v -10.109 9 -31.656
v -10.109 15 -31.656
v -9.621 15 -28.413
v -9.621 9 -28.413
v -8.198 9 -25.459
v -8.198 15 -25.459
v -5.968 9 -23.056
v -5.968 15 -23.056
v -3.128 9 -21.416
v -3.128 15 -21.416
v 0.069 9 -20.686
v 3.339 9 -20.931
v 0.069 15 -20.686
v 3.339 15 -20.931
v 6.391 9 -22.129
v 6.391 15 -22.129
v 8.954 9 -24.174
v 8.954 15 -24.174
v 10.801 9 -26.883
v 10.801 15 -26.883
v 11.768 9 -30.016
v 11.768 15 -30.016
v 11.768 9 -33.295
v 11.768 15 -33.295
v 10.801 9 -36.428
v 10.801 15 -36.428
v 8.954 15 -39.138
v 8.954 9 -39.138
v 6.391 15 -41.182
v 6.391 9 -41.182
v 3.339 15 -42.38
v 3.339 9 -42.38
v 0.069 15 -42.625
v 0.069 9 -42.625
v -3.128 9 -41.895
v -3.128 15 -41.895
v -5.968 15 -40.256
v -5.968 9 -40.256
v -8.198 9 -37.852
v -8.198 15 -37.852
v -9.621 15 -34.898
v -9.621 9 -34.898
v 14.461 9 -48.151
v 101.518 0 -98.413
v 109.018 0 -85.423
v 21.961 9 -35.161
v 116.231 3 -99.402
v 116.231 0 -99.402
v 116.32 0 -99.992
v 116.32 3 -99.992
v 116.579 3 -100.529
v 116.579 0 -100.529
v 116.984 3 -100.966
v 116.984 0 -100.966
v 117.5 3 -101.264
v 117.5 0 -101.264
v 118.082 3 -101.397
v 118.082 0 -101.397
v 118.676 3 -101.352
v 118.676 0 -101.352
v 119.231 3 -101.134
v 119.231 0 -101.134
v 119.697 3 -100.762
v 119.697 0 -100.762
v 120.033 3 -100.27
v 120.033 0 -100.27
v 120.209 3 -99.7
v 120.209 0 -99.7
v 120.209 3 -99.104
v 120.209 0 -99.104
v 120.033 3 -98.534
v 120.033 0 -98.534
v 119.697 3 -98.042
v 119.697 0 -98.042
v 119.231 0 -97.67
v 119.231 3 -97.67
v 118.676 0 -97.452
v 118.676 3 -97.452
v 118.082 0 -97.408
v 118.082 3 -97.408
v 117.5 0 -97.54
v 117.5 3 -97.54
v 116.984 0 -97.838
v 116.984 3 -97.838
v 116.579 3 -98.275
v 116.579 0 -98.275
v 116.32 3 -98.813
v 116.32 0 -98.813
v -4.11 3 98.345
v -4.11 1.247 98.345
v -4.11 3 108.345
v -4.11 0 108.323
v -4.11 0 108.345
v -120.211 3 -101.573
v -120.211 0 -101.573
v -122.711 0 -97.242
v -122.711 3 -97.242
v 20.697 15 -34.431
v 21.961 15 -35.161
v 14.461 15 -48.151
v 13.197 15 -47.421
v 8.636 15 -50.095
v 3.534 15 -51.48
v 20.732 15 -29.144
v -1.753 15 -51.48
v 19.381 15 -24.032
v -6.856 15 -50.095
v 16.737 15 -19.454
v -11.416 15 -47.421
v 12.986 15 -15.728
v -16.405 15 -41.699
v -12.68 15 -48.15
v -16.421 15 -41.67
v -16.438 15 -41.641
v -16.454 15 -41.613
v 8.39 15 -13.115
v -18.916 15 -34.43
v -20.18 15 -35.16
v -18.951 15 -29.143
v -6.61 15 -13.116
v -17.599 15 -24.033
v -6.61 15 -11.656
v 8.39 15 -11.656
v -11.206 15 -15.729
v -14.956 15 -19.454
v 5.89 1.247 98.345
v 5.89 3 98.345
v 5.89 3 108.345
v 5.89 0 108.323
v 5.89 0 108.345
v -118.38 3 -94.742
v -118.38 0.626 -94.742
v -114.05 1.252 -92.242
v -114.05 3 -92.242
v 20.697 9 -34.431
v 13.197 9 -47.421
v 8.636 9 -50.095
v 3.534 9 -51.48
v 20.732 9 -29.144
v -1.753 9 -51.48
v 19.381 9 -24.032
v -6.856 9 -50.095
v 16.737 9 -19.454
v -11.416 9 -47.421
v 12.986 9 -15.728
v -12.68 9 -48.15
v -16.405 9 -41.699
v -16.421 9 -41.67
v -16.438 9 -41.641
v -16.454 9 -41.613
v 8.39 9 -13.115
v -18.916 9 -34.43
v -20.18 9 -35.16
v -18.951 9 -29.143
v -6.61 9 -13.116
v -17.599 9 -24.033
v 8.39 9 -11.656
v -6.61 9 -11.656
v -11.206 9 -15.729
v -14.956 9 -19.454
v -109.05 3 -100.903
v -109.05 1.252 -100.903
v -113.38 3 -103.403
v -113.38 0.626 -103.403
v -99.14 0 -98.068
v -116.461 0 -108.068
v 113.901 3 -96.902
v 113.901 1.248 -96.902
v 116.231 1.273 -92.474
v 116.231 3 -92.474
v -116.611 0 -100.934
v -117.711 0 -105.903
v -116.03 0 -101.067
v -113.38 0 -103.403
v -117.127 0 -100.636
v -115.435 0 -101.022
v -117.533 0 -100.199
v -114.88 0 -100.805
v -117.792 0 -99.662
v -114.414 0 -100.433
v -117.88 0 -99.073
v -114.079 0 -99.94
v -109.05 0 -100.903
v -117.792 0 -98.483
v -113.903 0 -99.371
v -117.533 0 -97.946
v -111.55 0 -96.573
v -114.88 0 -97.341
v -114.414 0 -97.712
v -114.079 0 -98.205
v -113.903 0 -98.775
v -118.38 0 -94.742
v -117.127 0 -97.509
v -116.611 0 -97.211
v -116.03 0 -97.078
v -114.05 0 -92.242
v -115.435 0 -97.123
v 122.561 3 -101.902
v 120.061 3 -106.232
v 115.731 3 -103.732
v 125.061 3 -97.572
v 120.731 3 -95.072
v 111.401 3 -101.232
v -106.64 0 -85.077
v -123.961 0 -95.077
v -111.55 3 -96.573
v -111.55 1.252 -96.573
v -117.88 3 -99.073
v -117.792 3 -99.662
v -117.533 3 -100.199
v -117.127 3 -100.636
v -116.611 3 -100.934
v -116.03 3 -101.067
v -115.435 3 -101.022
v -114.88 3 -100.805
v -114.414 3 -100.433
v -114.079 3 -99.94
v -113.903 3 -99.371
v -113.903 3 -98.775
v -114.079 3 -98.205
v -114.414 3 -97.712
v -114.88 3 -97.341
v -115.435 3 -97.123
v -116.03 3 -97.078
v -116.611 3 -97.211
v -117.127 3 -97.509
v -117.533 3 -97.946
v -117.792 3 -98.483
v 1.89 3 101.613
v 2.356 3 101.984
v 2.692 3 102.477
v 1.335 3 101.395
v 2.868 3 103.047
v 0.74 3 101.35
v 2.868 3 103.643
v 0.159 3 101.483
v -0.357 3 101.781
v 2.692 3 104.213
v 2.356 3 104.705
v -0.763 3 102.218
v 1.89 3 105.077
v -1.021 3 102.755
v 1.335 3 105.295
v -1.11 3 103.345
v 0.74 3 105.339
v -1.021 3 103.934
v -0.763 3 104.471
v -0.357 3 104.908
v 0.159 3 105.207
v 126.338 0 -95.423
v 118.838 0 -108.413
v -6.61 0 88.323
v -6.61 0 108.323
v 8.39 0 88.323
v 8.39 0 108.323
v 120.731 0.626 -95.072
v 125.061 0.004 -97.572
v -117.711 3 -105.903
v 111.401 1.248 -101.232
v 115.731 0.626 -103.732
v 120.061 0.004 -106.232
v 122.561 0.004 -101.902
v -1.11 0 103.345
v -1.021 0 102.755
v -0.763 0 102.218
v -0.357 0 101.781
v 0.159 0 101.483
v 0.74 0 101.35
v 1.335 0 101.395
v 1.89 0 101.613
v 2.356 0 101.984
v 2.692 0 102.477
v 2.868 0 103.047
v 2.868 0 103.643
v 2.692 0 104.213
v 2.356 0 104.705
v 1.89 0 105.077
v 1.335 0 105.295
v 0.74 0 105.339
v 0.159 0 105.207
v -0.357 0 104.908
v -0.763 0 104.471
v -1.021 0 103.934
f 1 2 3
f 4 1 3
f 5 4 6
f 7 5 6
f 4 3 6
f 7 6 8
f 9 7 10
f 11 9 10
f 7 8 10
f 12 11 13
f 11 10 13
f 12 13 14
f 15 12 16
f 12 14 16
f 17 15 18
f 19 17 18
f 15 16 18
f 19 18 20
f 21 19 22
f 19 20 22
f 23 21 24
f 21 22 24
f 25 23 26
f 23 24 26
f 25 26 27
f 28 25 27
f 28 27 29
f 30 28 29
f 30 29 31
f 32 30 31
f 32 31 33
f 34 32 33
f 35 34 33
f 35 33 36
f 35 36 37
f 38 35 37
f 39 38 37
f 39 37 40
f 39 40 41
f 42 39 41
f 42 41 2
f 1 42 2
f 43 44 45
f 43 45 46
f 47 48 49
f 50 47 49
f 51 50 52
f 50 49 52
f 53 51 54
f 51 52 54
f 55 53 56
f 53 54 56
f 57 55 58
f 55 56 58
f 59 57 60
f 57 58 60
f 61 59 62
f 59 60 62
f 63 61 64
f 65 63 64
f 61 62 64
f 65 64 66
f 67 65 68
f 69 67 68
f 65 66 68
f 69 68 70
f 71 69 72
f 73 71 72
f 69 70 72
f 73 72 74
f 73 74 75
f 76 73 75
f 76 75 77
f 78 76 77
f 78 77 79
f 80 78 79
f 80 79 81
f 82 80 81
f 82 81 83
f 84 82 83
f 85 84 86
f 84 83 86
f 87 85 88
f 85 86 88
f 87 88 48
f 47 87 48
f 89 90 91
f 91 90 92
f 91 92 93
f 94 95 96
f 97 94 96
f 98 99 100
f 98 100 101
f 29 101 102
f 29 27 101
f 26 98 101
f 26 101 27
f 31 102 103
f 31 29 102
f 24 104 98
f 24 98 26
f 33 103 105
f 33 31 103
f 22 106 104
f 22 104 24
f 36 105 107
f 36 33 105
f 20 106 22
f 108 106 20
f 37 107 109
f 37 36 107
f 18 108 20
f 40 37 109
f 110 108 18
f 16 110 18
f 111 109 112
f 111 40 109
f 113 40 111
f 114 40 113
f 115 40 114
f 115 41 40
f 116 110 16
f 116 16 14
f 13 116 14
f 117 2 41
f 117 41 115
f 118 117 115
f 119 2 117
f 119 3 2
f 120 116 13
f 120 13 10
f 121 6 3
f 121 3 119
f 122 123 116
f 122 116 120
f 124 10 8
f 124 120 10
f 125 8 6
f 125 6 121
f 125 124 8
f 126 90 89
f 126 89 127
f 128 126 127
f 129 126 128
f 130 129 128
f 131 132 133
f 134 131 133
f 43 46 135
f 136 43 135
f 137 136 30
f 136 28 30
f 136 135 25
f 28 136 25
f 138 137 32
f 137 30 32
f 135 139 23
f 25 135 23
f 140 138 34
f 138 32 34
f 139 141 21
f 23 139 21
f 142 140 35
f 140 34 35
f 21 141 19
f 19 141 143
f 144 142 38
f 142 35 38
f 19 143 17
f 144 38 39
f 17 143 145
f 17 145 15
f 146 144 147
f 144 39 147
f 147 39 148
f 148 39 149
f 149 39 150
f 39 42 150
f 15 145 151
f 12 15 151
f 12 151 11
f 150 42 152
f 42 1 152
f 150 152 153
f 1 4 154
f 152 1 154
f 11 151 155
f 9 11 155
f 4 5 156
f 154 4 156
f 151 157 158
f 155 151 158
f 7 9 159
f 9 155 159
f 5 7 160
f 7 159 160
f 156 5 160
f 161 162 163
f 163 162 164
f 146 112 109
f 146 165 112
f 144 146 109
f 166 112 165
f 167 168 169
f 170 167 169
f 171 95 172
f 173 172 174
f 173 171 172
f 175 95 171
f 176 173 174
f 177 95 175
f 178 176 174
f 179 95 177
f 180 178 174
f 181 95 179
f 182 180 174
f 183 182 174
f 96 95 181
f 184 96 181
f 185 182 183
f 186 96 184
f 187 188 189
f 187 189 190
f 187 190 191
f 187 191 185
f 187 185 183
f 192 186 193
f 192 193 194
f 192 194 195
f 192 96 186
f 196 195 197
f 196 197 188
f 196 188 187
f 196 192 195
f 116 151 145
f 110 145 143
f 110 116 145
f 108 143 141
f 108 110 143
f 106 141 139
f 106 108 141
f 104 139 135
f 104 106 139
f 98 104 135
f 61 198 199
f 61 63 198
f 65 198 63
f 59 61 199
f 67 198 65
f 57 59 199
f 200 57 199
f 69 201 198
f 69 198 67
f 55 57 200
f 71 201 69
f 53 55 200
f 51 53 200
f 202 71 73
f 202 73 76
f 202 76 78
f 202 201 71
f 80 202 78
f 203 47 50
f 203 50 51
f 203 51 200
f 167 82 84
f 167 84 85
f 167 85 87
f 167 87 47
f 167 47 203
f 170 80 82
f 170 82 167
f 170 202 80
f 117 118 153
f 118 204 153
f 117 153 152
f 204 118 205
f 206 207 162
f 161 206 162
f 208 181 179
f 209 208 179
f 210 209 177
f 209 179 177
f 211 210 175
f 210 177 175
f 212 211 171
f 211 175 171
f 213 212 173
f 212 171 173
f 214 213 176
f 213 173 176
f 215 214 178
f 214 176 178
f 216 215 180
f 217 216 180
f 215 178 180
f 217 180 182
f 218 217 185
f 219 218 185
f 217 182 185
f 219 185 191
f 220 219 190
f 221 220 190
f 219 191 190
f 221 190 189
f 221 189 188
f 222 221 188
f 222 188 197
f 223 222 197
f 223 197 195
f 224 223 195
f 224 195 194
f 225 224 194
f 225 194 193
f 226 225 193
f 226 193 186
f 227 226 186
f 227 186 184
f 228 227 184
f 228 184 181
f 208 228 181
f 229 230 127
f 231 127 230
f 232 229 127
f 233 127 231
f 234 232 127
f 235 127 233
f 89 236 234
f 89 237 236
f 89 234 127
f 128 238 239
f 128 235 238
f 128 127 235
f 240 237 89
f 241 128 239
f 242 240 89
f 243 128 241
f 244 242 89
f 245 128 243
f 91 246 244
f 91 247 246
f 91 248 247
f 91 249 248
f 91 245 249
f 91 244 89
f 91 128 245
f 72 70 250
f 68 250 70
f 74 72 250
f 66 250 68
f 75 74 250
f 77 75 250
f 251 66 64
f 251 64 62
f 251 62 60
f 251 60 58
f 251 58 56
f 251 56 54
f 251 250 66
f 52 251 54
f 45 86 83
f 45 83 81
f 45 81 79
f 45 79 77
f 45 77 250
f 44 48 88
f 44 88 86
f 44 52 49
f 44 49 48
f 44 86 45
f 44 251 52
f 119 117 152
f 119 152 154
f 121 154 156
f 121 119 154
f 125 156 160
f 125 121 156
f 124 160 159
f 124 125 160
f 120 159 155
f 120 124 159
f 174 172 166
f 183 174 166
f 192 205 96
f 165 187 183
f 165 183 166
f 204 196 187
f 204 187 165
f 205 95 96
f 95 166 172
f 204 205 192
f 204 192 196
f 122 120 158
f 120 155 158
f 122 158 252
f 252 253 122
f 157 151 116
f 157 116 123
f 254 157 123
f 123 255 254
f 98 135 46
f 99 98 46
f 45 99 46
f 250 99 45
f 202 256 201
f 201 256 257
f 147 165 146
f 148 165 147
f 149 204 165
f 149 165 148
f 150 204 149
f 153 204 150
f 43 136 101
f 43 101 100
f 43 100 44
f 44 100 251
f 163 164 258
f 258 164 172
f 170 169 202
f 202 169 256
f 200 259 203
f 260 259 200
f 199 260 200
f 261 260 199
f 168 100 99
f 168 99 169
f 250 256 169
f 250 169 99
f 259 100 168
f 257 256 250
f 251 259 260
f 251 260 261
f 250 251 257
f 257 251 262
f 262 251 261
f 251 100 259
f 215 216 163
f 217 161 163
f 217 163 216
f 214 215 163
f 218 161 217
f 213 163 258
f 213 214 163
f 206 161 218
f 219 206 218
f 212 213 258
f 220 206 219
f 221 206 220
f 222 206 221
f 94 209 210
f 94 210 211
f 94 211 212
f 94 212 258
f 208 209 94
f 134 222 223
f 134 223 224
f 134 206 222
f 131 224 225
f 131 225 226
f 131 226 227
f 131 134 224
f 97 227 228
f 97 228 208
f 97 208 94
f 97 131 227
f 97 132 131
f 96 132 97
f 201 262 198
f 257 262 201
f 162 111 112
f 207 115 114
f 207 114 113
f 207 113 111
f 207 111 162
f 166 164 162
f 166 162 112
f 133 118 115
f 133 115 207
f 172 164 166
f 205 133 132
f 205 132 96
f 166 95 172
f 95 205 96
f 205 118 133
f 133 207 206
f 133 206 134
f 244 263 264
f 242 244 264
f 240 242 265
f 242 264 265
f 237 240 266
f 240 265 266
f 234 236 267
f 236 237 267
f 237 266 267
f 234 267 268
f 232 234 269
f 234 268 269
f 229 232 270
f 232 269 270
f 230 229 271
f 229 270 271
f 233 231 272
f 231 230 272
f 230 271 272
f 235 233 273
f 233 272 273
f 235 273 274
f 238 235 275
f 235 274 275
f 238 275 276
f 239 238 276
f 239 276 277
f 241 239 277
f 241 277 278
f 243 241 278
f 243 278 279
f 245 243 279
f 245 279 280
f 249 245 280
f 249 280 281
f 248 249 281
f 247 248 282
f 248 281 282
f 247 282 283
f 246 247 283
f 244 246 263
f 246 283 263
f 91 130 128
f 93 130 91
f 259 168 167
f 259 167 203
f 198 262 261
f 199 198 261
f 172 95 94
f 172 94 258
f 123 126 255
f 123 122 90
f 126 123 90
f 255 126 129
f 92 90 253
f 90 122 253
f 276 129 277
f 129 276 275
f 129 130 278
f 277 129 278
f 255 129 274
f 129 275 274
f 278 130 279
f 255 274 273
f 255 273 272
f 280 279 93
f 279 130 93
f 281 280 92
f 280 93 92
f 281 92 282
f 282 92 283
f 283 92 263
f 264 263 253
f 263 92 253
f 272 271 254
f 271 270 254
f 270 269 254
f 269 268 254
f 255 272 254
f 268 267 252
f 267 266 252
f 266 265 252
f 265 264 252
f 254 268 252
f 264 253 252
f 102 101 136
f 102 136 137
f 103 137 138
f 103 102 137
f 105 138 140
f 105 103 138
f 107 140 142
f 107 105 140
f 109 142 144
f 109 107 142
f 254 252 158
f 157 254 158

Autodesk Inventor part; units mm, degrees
ref_plane "YZ Plane" through (0, 0, 0) normal (1, 0, 0) x (0, 1, 0)
ref_plane "XY Plane" through (0, 0, 0) normal (0, 0, 1) x (1, 0, 0)
sketch "Эскиз1" plane through (0, 0, 0) normal (0, 1, 0) x (-1, 0, 0)
  circle A0 centre (-0.8899, -31.6552) radius 10
  circle A1 centre (-0.8899, -31.6552) radius 20
  line L0 (-0.8899, -11.6552) -> (-0.8899, 108.3448)
  line L1 (-0.8899, -31.6552) -> (78.1589, -77.294)
  line L2 (-0.8899, -31.6552) -> (90.3878, -31.6552) construction
  line L3 (78.1589, -77.294) -> (120.2106, -101.5726)
  line L4 (-0.8899, -31.6552) -> (116.9091, -31.6552) construction
  line L5 (-0.8899, -31.6552) -> (-104.8129, -91.6552)
  line L6 (-0.8899, -31.6552) -> (119.1101, -31.6552) construction
  line L7 (-104.8129, -91.6552) -> (-122.5612, -101.9021)
  line L8 (-122.5612, -101.9021) -> (-117.5612, -110.5624)
  line L9 (-117.5612, -110.5624) -> (4.1101, -40.3154)
  line L10 (-122.5612, -101.9021) -> (-127.5612, -93.2419)
  line L11 (-127.5612, -93.2419) -> (-5.8899, -22.9949)
  line L12 (120.2106, -101.5726) -> (125.2106, -92.9123)
  line L13 (125.2106, -92.9123) -> (4.1101, -22.9949)
  line L14 (120.2106, -101.5726) -> (7.7704, -36.6552)
  line L15 (-0.8899, 108.3448) -> (-10.8899, 108.3448)
  line L16 (-10.8899, 108.3448) -> (9.1101, 108.3448)
  line L17 (9.1101, 108.3448) -> (9.1101, -31.6552)
  line L18 (-10.8899, 108.3448) -> (-10.8899, -31.6552)
  line L19 (120.2106, -101.5726) -> (115.2106, -110.2328)
  line L20 (115.2106, -110.2328) -> (-5.8899, -40.3154)
  line L21 (9.1101, 108.3448) -> (9.1101, 88.3448)
  line L22 (9.1101, 88.3448) -> (-10.8899, 88.3448)
  line L23 (-10.8899, 108.3448) -> (9.1101, 88.3448)
  line L24 (9.1101, 108.3448) -> (-10.8899, 88.3448)
  line L25 (-0.8899, 98.3448) -> (-0.8899, 93.3448)
  line L26 (-0.8899, 93.3448) -> (4.1101, 93.3448)
  line L27 (4.1101, 103.3448) -> (-5.8899, 103.3448)
  line L28 (-5.8899, 103.3448) -> (-5.8899, 93.3448)
  line L29 (-5.8899, 93.3448) -> (-0.8899, 93.3448)
  line L30 (-127.5612, -93.2419) -> (-110.2407, -83.2419)
  line L31 (-110.2407, -83.2419) -> (-100.2407, -100.5624)
  line L32 (-127.5612, -93.2419) -> (-100.2407, -100.5624)
  line L33 (-117.5612, -110.5624) -> (-110.2407, -83.2419)
  line L34 (-113.9009, -96.9021) -> (-118.2311, -99.4021)
  line L35 (-118.2311, -99.4021) -> (-115.7311, -103.7322)
  line L36 (-115.7311, -103.7322) -> (-107.0708, -98.7322)
  line L37 (-107.0708, -98.7322) -> (-112.0708, -90.072)
  line L38 (-112.0708, -90.072) -> (-120.7311, -95.072)
  line L39 (-120.7311, -95.072) -> (-118.2311, -99.4021)
  circle A2 centre (-113.9009, -96.9021) radius 2
  line L40 (120.2106, -101.5726) -> (111.5503, -96.5726)
  line L41 (111.5503, -96.5726) -> (102.8901, -91.5726)
  line L42 (102.8901, -91.5726) -> (107.2202, -94.0726)
  line L43 (107.2202, -94.0726) -> (104.7202, -98.4027)
  line L44 (104.7202, -98.4027) -> (113.3805, -103.4027)
  line L45 (113.3805, -103.4027) -> (118.3805, -94.7424)
  line L46 (118.3805, -94.7424) -> (109.7202, -89.7424)
  line L47 (109.7202, -89.7424) -> (107.2202, -94.0726)
  line L48 (104.7202, -98.4027) -> (118.3805, -94.7424)
  circle A3 centre (111.5503, -96.5726) radius 2
  circle A4 centre (-118.2311, -99.4021) radius 2
  line L49 (-113.9009, -96.9021) -> (-116.2311, -92.4739)
  line L50 (-116.2311, -92.4739) -> (-125.0612, -97.572)
  line L51 (-113.9009, -96.9021) -> (-111.4009, -101.2322)
  line L52 (-111.4009, -101.2322) -> (-120.0612, -106.2322)
  line L53 (-125.0612, -97.572) -> (-120.0612, -106.2322)
  line L54 (-5.8899, 103.3448) -> (-5.8899, 108.3448)
  line L55 (4.1101, 103.3448) -> (4.1101, 108.3448)
  line L56 (4.1101, 103.3448) -> (4.1101, 98.3448)
  line L57 (4.1101, 98.3448) -> (-5.8899, 98.3448)
  circle A5 centre (-0.8899, 103.3448) radius 2
  line L58 (118.3805, -94.7424) -> (122.7106, -97.2424)
  line L59 (113.3805, -103.4027) -> (117.7106, -105.9027)
  line L60 (111.5503, -96.5726) -> (109.0503, -100.9027)
  line L61 (111.5503, -96.5726) -> (114.0503, -92.2424)
  circle A6 centre (115.8805, -99.0726) radius 2
  point P0 (0, 0)
  point P1 (-0.8899, 101.3448)
  point P2 (1.1101, 103.3448)
  point P3 (-0.8899, 103.3448)
  dimension "d0" = 20
  dimension "d1" = 40
  dimension "d2" = 120
  dimension "d3" = 30
  dimension "d4" = 120
  dimension "d5" = 150
  dimension "d6" = 10
  dimension "d7" = 10
  dimension "d8" = 10
  dimension "d9" = 10
  dimension "d13" = 20
  dimension "d38" = 5
  dimension "d39" = 20
  dimension "d40" = 5
  dimension "d41" = 4
  dimension "d42" = 10
  dimension "d43" = 10
  dimension "d44" = 5
  dimension "d45" = 10
  dimension "d46" = 10
  dimension "d47" = 10
  dimension "d48" = 4
  dimension "d53" = 4
  dimension "d58" = 4
  dimension "d63" = 4
ref_plane "РабПлоскость1" through (0, 15, 0) normal (0, 1, 0) x (-1, 0, 0)
sketch "Эскиз2" plane through (0, 15, 0) normal (0, 1, 0) x (-1, 0, 0)
  circle A0 centre (-0.8908, -31.6557) radius 10
  circle A1 centre (-0.8908, -31.6557) radius 20
  circle A2 centre (-0.8908, -31.6557) radius 11
  point P0 (0, 0)
  dimension "d11" = 20
  dimension "d12" = 40
  dimension "d68" = 22
extrude "Выдавливание1" add sketch "Эскиз2" against normal blind 6 contours A1 | A2
ref_plane "РабПлоскость2" through (0.8899, 0, -31.6552) normal (0.5, 0, 0.866) x (0.866, 0, -0.5)
ref_plane "РабПлоскость3" through (-120.2106, 0, -101.5726) normal (0.5, 0, -0.866) x (0.866, 0, 0.5)
sketch "Эскиз4" plane through (0.8899, 0, -31.6552) normal (0.5, 0, 0.866) x (0.866, 0, -0.5)
  line L0 (20.0011, 15) -> (-19.9989, 15) projected
  line L1 (-19.9989, 9) -> (20.0011, 9) projected
  line L2 (20.0011, 15) -> (20.0011, 9)
  line L3 (20.0011, 15) -> (140.5253, 0)
  line L4 (140.5253, 0) -> (120.5253, 0)
  line L5 (120.5253, 0) -> (20.0011, 9)
  line L6 (20.0011, 15) -> (19.0011, 15)
  line L7 (20.0011, 15) -> (18.0011, 15)
  line L8 (18.0011, 15) -> (18.0011, 9)
  line L9 (20.0011, 9) -> (18.0011, 9)
  point P0 (-16.5982, 0)
  point P1 (-17.3194, 15)
  point P2 (-17.3194, 15)
  dimension "d22" = 20
  dimension "d25" = 2
extrude "Выдавливание3" add sketch "Эскиз4" along normal mid plane 15
ref_plane "РабПлоскость4" through (0.8899, 0, -11.6552) normal (1, 0, 0) x (0, 0, 1)
sketch "Эскиз5" plane through (0.8899, 0, -11.6552) normal (1, 0, 0) x (0, 0, 1)
  point P0 (11.6552, 0)
sketch "Эскиз6" plane through (0.8899, 0, -11.6552) normal (1, 0, 0) x (0, 0, 1)
  line L0 (-40.0005, -15) -> (-0.0005, -15) projected
  line L1 (-0.0005, -15) -> (119.9781, 0)
  line L2 (119.9781, 0) -> (99.9781, 0)
  line L3 (-0.0005, -9) -> (-40.0005, -9) projected
  line L4 (99.9781, 0) -> (-0.0005, -9)
  line L5 (-0.0005, -9) -> (-2.0005, -9)
  line L6 (-2.0005, -9) -> (-2.0005, -15)
  line L7 (-0.0005, -15) -> (-2.0005, -15)
  point P0 (11.6552, 0)
  point P1 (-35.766, -15)
  point P2 (-22.7756, -15)
  point P3 (-22.7756, -9)
  point P4 (-35.766, -9)
  dimension "d29" = 20
  dimension "d30" = 2
extrude "Выдавливание4" add sketch "Эскиз6" along normal mid plane 15
sketch "Эскиз7" plane through (-120.2106, 0, -101.5726) normal (0.5, 0, -0.866) x (0.866, 0, 0.5)
  line L0 (119.8354, -15) -> (142.6104, -15) projected
  line L1 (119.8354, -15) -> (0, 0)
  line L2 (0, 0) -> (20, 0)
  line L3 (142.6104, -9) -> (119.8354, -9) projected
  line L4 (20, 0) -> (119.8354, -9)
  line L5 (119.8354, -9) -> (121.8354, -9)
  line L6 (121.8354, -9) -> (121.8354, -15)
  line L7 (119.8354, -15) -> (121.8354, -15)
  point P0 (154.8917, 0)
  point P1 (142.6094, -15)
  point P2 (142.6094, -9)
  dimension "d33" = 20
  dimension "d34" = 2
extrude "Выдавливание5" add sketch "Эскиз7" along normal mid plane 15
extrude "Выдавливание8" add sketch "Эскиз1" along normal blind 3 contours L50 L39 A4 L7 L10 | L38 L49 A2 L32 | L32 A2 L7 A4 L39 | L8 L7 A4 L35 L52 | L35 A4 L7 A2 L33 | L33 A2 L51 L36 | A2 L49 L32 | L32 L7 A2 | L33 A2 L7 | L51 A2 L33 picked at (-115.1931, -97.2034) picked at (-114.6016, -98.0289)
extrude "Выдавливание9" cut sketch "Эскиз1" along normal blind 4 contours A4 L7 L39 | L39 L7 A4 | A4 L7 L35 | L35 L7 A4
extrude "Выдавливание10" add sketch "Эскиз1" along normal blind 3 contours L55 L27 A5 L0 L16 | L56 L57 L24 | L24 L0 A5 L27 | L23 L27 A5 L0 | L57 L28 L23 | L0 A5 L27 L54 L15 | A5 L0 L27 picked at (0.232, 102.6399)
extrude "Выдавливание11" cut sketch "Эскиз1" along normal blind 3 contours A5 L0 L27 | L27 L0 A5 | A5 L27 L0 | L0 L27 A5
extrude "Выдавливание12" add sketch "Эскиз1" along normal blind 3 contours L12 L3 A6 L45 L58 | L59 L45 A6 L3 L19 | L48 A3 L61 L46 | L45 A6 L3 A3 L48 | L44 L60 A3 L3 A6 L45 | A3 L3 L48 | L48 L61 A3 | L3 A3 L60 picked at (112.8333, -96.9164)
extrude "Выдавливание13" cut sketch "Эскиз1" along normal blind 3 contours A6 L45 L3 | L3 L45 A6 | L45 L3 A6 | A6 L3 L45
sketch "Эскиз8" plane through (0, 15, 0) normal (0, 1, 0) x (1, 0, 0)
  point P0 (0, 0)
extrude "Выдавливание14" cut sketch "Эскиз2" against normal blind 10 contours A0 | A2
properties part number "axis"
